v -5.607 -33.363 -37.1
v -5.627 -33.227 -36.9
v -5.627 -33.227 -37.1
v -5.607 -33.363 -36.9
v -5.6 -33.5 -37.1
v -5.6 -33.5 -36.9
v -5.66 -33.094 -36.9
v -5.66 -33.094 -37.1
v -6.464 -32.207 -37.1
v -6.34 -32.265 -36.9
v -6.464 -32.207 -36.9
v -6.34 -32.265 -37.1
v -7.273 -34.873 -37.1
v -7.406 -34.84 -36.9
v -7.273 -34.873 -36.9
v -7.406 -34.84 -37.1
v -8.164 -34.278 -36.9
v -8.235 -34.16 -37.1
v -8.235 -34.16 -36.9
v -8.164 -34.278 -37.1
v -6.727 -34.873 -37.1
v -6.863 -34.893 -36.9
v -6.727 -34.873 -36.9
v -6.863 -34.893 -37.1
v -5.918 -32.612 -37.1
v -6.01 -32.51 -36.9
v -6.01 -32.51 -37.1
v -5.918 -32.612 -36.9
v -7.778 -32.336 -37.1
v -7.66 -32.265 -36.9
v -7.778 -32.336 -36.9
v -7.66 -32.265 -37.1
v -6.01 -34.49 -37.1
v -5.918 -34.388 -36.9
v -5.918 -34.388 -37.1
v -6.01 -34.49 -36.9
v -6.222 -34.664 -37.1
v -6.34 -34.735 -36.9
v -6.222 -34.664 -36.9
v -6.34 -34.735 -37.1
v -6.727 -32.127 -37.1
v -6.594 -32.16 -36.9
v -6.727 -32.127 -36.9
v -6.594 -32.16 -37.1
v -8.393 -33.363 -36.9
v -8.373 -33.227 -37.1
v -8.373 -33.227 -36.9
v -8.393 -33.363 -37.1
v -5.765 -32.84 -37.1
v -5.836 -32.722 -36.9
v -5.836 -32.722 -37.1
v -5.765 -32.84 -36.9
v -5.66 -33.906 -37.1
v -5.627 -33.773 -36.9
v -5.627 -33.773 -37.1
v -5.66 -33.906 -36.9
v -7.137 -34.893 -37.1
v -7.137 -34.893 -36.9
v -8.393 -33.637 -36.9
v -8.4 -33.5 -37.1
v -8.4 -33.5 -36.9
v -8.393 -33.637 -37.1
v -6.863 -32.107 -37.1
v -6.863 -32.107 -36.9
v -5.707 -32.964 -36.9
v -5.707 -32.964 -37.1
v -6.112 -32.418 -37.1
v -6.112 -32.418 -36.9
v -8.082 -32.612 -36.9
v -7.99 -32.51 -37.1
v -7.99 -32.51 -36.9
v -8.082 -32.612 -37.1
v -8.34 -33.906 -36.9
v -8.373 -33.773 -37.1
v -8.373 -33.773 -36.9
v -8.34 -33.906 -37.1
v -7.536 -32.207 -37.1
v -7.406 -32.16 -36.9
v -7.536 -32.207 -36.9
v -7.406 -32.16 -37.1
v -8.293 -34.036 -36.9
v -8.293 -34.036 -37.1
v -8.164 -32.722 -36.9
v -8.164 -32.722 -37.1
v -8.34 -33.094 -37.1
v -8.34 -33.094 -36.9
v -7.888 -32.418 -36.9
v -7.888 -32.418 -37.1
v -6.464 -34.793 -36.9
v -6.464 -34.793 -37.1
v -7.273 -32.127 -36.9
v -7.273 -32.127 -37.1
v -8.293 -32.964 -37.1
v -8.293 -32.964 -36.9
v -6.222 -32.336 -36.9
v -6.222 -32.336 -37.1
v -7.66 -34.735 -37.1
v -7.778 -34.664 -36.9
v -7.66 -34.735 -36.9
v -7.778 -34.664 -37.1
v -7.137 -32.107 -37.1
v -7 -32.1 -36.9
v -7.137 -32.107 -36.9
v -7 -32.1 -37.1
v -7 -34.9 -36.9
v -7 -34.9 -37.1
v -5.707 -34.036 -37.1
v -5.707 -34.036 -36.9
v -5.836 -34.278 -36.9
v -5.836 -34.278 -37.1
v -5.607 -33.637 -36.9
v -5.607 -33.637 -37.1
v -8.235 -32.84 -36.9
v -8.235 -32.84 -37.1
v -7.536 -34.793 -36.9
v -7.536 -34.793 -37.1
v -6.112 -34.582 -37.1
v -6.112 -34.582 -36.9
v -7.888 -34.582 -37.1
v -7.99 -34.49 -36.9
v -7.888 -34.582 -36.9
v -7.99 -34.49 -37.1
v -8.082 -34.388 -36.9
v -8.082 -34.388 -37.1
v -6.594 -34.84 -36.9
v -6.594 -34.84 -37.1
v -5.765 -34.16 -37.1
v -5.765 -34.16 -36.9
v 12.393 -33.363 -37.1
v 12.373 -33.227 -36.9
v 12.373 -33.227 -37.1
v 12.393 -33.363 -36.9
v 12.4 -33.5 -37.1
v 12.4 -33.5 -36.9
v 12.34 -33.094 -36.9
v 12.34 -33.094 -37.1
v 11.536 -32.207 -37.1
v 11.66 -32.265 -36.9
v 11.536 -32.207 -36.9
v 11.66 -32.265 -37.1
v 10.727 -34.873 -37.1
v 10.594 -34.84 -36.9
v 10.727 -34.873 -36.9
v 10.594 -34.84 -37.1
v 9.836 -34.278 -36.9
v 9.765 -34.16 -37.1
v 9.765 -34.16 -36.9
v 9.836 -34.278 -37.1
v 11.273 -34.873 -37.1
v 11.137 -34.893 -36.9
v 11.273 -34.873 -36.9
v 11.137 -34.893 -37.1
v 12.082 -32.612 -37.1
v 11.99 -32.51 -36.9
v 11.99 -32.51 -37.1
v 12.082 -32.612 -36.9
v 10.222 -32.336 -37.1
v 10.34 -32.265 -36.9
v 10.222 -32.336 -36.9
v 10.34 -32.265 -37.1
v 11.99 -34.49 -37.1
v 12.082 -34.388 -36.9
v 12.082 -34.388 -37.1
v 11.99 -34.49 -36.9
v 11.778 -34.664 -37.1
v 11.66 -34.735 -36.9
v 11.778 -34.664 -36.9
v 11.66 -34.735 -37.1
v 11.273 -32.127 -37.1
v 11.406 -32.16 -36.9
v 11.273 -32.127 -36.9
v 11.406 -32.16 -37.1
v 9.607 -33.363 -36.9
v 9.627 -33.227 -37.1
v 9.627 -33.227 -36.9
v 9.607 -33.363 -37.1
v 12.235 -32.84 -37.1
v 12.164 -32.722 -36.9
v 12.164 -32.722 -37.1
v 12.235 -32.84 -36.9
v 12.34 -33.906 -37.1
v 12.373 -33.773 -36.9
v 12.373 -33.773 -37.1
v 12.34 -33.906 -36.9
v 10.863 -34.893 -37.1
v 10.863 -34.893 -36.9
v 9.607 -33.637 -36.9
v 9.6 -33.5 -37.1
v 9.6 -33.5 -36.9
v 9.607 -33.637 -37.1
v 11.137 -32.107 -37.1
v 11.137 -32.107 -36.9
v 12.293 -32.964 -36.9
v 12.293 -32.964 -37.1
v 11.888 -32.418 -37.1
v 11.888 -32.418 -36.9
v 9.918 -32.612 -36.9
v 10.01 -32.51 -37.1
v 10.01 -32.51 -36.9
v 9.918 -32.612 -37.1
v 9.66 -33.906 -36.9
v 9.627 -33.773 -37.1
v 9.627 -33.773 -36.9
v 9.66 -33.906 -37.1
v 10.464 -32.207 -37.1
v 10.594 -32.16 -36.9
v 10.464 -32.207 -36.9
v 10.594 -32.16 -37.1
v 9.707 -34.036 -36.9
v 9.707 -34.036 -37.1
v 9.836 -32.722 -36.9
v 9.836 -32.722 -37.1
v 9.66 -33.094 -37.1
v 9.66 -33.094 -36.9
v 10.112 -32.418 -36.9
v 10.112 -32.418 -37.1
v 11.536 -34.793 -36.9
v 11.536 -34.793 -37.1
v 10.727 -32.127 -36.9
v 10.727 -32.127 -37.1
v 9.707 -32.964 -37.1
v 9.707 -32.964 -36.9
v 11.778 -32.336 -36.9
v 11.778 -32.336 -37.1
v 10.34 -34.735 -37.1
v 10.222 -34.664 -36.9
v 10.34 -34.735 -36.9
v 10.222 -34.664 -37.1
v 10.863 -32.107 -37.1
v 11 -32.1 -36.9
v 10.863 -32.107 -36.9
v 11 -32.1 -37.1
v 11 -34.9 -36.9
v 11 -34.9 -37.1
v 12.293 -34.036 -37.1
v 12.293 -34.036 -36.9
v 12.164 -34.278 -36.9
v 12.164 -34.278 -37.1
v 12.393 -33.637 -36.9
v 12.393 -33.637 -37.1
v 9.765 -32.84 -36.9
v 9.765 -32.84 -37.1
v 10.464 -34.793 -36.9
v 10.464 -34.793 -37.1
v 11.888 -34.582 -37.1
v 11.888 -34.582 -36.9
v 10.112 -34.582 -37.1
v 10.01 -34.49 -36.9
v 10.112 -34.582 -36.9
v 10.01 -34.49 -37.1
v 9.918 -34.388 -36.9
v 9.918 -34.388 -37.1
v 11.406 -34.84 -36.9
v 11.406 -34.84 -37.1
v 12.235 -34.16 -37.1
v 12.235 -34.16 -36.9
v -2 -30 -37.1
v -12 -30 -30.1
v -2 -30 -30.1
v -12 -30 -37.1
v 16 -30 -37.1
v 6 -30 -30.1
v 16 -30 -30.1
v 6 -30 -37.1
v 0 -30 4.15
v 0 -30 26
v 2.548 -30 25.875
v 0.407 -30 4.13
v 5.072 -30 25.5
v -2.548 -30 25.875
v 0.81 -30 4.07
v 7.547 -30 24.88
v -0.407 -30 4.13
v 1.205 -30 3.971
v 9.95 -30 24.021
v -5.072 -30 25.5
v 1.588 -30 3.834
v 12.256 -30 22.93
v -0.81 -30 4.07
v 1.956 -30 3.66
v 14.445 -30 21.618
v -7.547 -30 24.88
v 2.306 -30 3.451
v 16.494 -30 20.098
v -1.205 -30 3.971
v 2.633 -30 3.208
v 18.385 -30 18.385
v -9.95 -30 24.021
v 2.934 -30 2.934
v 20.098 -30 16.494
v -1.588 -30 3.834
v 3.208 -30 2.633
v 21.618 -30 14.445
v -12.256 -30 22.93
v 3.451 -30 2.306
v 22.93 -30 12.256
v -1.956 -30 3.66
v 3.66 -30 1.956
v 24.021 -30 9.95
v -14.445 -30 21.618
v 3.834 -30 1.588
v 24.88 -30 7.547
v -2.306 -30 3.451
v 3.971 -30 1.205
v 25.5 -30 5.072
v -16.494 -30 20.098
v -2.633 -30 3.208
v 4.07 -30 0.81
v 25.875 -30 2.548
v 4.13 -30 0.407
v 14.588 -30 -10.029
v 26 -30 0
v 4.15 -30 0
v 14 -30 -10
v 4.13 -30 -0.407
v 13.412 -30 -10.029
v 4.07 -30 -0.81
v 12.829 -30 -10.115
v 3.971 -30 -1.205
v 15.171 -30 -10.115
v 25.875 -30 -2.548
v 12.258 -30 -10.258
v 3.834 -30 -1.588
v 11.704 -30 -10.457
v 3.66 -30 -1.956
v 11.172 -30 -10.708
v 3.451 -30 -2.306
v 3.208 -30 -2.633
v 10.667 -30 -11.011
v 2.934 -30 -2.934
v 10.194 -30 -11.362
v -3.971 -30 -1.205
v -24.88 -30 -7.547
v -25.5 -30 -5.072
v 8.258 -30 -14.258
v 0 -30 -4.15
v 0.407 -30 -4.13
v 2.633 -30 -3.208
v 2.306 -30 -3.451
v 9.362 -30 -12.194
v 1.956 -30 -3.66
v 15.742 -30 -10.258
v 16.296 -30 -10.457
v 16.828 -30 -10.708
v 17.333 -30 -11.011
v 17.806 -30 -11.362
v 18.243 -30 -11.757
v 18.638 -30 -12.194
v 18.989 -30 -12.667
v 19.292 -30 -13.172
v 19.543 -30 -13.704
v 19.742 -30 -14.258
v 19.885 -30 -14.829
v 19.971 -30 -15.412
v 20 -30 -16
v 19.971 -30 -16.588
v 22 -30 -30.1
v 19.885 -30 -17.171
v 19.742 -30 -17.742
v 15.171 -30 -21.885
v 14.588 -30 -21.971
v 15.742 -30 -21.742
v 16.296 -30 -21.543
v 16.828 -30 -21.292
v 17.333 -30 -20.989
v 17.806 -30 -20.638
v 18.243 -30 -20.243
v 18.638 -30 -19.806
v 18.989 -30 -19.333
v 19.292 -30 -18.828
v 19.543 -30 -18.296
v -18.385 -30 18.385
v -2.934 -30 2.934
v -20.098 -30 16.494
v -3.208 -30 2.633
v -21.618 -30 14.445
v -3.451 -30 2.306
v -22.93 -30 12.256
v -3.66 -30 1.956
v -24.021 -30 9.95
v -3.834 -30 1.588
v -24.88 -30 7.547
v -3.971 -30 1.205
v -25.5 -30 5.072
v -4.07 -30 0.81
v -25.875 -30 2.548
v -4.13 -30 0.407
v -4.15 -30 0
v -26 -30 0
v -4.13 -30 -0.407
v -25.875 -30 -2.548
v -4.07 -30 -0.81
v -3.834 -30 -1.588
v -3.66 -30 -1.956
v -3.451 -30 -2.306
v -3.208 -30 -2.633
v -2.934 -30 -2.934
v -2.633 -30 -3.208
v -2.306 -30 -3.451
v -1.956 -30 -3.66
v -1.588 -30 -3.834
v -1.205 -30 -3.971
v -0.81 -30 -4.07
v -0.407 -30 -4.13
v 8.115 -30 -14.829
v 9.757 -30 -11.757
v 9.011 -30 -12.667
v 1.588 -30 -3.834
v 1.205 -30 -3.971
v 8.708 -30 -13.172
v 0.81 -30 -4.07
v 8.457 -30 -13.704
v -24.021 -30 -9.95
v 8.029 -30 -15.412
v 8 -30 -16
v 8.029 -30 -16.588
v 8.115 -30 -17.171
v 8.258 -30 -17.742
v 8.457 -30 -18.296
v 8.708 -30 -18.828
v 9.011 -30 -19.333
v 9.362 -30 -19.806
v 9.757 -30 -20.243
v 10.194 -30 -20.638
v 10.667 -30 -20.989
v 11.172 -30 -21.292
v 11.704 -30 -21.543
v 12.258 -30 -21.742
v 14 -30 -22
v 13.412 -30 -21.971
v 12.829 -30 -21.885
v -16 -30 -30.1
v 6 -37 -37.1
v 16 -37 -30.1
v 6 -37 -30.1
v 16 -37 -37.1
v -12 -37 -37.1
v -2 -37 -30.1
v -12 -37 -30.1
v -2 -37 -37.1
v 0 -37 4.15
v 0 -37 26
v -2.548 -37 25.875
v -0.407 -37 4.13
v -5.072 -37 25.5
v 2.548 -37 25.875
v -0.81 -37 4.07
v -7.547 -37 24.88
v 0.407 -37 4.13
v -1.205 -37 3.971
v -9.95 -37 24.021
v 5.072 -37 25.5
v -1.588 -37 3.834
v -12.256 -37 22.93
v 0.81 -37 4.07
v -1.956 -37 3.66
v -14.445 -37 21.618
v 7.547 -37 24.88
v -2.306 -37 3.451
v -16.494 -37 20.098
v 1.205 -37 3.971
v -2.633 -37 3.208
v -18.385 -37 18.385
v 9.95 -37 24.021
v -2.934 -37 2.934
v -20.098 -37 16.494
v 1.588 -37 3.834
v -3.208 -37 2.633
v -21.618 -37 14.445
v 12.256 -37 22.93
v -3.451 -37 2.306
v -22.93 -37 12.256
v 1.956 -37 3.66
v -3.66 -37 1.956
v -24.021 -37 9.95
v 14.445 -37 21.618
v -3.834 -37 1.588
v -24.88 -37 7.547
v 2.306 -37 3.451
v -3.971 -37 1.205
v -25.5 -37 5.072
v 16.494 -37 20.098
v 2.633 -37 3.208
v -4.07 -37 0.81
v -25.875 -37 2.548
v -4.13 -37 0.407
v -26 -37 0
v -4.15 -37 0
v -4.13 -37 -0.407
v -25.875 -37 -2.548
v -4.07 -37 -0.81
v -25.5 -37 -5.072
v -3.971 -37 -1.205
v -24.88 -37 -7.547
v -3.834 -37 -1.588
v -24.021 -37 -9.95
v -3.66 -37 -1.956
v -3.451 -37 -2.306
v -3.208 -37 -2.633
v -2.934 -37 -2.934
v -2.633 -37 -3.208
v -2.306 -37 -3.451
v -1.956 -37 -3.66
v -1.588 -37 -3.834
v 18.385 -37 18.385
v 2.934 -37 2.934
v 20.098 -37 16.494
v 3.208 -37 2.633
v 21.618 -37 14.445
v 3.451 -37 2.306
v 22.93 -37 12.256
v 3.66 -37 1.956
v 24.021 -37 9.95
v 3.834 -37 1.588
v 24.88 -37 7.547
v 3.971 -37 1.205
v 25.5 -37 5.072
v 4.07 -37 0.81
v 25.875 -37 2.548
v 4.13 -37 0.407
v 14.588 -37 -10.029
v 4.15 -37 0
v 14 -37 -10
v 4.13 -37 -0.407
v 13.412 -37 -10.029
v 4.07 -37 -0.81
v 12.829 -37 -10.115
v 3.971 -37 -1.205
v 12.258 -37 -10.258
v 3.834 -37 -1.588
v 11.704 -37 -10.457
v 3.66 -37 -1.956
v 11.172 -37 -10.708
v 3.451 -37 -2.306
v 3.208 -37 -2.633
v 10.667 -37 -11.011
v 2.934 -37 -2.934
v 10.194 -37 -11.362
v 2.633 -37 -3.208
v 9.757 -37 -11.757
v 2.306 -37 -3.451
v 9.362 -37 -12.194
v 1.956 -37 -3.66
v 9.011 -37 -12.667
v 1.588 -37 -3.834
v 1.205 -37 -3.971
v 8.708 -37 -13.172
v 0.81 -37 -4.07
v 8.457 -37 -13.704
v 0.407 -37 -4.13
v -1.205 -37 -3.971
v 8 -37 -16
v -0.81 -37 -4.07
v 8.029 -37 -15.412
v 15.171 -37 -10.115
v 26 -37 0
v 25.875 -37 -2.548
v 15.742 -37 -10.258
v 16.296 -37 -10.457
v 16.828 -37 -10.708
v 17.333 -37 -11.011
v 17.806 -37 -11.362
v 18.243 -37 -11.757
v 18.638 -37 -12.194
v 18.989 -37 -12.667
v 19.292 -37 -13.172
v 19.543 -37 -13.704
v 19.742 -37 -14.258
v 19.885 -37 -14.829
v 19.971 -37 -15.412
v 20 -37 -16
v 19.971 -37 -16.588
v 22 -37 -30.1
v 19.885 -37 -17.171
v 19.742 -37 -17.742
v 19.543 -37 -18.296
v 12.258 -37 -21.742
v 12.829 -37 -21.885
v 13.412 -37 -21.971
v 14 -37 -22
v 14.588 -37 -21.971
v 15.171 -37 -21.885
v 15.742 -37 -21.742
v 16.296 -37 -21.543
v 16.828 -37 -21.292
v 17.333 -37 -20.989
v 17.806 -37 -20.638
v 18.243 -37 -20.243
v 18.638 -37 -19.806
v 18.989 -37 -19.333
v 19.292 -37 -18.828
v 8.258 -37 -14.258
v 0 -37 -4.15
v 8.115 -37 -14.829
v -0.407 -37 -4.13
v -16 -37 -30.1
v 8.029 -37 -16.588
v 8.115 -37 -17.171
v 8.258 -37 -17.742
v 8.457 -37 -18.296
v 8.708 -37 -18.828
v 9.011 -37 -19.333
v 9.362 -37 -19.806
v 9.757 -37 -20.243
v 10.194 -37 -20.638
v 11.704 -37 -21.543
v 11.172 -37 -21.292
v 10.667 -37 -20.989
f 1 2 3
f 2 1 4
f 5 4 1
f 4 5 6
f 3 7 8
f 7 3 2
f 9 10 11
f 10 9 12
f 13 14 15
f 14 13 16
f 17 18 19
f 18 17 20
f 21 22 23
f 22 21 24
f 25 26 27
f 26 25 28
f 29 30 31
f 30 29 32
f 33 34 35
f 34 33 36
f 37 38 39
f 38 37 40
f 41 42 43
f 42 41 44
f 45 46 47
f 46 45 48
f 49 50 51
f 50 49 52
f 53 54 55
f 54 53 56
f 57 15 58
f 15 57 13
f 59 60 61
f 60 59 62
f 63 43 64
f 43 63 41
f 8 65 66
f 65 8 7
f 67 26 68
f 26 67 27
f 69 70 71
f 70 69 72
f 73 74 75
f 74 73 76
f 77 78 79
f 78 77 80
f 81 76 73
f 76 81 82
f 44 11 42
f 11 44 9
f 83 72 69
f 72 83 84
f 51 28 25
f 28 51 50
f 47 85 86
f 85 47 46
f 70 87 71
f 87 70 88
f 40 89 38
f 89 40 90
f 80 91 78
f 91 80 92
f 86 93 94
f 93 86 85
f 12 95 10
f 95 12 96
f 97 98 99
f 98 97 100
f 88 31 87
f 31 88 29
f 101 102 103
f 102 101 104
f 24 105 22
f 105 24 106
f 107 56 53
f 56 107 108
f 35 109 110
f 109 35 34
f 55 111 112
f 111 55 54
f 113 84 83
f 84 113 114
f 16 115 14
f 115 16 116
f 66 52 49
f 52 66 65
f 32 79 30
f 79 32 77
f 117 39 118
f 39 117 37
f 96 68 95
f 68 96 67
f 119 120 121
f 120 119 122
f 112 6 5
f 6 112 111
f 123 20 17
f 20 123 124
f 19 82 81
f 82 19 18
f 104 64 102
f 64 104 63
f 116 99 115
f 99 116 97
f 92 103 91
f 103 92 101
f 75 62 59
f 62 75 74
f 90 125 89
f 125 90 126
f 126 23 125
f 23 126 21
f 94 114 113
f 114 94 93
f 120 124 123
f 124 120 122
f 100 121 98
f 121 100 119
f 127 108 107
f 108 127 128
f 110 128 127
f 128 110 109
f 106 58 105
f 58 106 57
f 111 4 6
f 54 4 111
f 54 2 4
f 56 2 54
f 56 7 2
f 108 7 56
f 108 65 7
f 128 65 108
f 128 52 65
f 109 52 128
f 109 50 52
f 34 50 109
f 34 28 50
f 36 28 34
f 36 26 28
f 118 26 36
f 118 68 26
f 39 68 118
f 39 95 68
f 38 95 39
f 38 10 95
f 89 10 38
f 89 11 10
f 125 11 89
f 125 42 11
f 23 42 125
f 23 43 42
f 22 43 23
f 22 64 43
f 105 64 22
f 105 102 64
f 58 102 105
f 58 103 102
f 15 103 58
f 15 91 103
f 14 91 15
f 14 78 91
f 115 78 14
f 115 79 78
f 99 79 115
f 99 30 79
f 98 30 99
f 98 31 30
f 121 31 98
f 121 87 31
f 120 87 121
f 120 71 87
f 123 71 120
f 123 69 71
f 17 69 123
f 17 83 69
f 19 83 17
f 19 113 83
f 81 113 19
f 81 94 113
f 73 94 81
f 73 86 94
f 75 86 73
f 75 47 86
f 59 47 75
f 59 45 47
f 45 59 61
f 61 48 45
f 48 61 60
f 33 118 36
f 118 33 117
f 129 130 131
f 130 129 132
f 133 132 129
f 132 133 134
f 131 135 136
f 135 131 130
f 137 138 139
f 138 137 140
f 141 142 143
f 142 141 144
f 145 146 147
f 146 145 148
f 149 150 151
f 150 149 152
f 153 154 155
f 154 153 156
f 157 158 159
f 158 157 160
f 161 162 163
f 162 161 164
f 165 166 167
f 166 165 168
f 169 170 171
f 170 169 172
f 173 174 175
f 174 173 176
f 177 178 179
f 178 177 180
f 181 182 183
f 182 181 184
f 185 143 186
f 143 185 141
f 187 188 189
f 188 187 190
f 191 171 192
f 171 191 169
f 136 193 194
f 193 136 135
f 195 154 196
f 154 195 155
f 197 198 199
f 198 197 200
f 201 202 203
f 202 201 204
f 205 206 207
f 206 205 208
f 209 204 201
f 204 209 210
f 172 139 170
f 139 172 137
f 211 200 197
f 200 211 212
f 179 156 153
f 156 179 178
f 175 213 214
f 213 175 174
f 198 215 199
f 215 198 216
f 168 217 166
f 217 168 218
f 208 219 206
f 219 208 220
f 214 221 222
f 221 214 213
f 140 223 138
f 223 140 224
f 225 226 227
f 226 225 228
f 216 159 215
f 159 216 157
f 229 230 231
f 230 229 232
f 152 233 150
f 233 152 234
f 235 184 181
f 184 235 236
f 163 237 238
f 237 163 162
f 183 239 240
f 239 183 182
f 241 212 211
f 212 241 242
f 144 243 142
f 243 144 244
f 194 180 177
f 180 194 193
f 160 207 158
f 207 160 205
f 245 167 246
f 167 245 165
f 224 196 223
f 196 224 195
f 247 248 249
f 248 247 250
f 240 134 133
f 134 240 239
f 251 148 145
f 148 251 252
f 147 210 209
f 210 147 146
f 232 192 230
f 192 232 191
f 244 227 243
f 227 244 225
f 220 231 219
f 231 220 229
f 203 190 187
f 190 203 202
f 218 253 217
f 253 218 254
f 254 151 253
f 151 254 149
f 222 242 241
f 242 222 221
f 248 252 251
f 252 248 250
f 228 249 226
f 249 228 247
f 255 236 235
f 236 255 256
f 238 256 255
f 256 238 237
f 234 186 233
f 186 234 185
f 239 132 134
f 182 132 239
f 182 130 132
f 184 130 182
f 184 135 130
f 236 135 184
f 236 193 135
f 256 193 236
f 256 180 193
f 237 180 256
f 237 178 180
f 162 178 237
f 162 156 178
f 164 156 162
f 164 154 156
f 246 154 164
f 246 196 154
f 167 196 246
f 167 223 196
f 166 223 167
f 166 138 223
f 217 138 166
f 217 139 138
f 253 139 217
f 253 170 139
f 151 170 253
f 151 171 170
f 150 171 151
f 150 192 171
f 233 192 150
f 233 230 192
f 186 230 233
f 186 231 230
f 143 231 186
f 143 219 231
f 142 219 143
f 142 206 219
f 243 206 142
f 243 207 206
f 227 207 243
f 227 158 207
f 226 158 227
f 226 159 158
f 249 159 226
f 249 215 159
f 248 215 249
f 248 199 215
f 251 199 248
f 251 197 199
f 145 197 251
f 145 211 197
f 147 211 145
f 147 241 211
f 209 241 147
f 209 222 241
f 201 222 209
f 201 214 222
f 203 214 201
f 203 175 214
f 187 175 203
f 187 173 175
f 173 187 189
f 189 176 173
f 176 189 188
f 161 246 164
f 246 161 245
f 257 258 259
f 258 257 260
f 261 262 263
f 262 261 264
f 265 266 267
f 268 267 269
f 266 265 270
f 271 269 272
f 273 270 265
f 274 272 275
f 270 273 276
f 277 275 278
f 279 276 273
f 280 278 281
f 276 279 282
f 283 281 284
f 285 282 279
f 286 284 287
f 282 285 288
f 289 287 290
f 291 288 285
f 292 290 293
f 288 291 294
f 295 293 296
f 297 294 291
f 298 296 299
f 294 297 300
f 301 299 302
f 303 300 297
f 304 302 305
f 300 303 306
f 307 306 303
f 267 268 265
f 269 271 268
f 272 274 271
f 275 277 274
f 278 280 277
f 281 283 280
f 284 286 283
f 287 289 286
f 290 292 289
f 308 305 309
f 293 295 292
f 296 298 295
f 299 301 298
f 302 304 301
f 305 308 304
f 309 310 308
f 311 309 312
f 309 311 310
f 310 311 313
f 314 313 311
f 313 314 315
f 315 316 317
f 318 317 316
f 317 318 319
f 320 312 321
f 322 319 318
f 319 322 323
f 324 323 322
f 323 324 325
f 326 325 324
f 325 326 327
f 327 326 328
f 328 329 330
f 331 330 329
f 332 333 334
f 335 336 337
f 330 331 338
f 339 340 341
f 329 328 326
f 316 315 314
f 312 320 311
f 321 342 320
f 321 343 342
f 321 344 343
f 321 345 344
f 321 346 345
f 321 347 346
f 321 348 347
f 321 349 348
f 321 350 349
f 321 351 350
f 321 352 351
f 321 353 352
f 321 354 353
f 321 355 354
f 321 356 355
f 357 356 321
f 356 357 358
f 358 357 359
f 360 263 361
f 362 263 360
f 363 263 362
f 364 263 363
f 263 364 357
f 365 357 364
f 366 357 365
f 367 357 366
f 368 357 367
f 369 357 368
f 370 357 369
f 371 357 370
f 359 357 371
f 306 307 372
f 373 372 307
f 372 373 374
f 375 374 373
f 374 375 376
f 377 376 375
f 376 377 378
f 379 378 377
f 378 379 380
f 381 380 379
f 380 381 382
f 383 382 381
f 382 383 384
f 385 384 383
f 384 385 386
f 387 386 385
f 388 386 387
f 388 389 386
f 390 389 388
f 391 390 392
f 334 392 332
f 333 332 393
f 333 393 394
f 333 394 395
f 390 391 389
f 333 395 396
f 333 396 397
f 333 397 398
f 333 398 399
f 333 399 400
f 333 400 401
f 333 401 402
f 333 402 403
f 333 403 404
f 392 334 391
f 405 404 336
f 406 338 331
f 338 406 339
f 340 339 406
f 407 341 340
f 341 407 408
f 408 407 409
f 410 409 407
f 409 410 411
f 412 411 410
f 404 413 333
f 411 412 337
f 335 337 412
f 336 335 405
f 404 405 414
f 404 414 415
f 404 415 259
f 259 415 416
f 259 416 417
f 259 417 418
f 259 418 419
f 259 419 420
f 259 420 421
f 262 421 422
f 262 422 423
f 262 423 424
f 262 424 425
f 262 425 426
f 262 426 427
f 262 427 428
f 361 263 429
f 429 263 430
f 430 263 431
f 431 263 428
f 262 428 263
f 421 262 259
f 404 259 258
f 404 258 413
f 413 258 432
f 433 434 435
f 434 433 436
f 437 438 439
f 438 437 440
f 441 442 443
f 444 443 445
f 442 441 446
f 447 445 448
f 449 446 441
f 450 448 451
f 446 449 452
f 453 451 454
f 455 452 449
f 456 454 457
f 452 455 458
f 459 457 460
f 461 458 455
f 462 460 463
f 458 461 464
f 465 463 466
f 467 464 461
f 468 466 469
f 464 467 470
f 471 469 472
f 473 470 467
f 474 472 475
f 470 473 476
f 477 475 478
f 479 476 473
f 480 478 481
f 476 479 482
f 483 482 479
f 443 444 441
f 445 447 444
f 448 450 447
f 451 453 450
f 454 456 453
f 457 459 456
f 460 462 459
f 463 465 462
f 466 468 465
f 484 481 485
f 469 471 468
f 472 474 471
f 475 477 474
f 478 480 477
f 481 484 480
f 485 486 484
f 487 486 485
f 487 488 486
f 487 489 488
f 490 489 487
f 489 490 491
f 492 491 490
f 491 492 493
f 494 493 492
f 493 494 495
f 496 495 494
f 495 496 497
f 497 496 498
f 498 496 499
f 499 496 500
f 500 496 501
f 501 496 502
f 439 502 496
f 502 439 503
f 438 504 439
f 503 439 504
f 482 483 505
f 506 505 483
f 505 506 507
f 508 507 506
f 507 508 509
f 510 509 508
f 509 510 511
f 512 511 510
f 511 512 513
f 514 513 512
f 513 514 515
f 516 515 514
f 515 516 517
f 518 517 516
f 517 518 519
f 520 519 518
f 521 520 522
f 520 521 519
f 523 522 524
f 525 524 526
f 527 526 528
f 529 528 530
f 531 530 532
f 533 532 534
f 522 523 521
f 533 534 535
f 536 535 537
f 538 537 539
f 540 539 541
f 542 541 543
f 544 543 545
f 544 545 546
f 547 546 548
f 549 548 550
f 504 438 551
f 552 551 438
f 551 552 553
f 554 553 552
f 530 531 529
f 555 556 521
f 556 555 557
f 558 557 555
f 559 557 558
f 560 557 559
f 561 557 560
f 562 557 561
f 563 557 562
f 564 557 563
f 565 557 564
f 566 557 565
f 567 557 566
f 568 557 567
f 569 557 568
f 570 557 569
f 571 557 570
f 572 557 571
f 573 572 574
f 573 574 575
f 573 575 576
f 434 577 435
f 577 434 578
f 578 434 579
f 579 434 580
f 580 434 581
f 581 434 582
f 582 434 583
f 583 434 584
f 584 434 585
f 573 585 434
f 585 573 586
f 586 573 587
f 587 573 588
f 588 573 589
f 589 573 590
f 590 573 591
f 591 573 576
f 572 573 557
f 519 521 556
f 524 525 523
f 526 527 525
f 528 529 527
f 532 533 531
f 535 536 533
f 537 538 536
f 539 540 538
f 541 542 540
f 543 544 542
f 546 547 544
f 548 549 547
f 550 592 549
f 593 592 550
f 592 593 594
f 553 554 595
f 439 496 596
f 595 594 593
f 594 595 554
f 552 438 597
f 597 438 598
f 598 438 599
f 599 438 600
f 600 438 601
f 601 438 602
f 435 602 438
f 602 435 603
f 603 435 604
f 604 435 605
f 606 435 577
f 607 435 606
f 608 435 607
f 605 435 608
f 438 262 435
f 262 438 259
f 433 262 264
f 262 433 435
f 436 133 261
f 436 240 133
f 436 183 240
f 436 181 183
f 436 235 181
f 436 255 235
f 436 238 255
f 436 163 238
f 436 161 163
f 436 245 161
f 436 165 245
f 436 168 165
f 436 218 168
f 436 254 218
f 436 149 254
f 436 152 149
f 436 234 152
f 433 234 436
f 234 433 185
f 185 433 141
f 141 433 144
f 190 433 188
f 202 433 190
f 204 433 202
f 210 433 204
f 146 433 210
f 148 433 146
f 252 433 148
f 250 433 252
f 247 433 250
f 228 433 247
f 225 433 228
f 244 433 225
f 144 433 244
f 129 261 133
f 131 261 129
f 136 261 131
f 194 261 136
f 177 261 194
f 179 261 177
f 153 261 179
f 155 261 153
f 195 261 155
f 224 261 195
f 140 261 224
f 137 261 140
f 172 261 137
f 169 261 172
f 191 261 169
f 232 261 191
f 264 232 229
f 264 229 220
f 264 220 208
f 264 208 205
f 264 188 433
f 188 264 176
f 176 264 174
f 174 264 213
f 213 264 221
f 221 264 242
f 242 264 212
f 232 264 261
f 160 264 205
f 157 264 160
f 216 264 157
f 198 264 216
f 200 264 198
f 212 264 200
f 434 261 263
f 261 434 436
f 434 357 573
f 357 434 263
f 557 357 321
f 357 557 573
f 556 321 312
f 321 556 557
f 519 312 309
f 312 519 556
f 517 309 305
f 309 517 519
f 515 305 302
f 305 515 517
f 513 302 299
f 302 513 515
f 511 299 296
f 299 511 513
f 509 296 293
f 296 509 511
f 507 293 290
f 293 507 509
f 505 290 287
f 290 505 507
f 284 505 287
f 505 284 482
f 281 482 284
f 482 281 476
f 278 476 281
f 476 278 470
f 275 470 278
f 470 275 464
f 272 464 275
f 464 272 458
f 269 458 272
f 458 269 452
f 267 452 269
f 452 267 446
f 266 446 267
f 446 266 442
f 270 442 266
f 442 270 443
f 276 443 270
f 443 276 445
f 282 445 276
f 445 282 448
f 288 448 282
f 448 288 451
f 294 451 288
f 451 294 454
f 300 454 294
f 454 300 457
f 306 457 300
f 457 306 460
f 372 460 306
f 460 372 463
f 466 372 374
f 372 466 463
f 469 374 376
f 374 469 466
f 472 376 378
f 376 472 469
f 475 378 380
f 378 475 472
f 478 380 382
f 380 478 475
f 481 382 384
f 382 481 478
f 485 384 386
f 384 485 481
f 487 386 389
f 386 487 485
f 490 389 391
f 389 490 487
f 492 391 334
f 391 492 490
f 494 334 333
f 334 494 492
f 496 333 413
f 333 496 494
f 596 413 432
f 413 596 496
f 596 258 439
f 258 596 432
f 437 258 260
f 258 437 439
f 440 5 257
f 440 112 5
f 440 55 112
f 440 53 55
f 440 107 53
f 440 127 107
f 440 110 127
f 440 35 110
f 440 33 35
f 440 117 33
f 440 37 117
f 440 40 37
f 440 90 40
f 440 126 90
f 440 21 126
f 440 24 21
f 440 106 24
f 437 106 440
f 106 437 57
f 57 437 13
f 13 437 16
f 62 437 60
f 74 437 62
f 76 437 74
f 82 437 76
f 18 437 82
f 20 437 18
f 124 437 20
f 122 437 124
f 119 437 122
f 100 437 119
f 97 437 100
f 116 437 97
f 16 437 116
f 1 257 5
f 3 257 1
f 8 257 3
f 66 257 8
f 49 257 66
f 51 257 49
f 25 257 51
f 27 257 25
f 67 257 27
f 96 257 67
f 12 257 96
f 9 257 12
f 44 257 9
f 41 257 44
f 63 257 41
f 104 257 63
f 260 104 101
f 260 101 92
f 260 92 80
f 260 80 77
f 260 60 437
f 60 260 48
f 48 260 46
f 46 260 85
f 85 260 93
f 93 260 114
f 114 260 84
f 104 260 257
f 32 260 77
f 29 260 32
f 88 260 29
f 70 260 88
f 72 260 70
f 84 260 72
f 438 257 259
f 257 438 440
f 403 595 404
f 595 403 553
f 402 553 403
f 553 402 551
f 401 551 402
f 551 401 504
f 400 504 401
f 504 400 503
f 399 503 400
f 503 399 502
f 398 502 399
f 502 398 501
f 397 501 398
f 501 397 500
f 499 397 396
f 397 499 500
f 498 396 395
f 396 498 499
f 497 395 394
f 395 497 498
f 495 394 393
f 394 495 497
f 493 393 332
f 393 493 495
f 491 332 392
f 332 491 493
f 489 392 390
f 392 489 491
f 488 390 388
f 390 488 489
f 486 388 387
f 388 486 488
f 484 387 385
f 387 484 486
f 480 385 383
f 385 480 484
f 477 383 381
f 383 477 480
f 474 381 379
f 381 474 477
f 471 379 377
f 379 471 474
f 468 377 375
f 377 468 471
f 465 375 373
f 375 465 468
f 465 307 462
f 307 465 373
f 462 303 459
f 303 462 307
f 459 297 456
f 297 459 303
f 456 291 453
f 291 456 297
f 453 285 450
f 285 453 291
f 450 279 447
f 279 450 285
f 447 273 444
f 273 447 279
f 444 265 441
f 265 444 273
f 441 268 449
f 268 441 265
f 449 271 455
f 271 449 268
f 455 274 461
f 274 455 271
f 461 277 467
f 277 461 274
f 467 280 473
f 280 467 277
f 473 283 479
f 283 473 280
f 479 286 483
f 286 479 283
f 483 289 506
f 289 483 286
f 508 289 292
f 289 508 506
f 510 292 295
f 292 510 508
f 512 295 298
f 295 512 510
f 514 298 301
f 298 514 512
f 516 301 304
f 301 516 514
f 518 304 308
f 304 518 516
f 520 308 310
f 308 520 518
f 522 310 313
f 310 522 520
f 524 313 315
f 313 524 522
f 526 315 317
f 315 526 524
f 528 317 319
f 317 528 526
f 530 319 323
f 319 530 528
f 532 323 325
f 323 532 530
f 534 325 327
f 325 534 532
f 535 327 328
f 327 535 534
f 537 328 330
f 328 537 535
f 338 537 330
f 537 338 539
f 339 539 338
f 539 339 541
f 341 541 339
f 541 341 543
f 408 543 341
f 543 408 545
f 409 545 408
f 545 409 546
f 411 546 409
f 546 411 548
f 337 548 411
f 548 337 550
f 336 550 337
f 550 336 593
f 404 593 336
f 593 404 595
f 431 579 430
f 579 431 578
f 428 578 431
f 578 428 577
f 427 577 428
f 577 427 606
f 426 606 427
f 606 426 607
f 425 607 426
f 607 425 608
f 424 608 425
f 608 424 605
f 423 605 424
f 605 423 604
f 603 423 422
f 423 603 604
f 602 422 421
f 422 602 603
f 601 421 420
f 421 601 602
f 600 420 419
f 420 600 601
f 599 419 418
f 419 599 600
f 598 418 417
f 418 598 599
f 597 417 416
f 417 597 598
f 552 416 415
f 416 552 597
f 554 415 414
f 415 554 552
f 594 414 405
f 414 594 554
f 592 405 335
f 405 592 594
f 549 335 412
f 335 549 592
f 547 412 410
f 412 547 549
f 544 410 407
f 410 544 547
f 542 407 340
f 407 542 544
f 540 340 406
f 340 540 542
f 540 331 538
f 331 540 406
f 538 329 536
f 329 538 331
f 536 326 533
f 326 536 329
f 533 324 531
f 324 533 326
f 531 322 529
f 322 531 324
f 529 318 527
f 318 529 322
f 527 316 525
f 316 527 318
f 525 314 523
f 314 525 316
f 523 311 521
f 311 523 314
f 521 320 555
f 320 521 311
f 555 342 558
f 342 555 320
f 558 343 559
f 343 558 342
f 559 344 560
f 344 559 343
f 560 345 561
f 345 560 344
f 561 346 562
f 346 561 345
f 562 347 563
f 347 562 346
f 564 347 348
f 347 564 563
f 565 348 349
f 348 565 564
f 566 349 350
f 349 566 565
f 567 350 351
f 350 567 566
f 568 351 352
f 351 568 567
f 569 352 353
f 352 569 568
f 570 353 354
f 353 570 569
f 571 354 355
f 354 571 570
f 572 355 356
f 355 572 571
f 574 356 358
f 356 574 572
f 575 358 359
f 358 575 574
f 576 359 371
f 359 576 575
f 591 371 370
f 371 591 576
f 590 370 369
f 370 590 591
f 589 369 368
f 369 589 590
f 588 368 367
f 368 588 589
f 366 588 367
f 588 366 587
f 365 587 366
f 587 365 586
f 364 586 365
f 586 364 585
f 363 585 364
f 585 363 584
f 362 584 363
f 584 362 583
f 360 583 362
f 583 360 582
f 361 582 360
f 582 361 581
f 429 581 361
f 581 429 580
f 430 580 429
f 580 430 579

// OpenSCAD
// file: ../lib/vitamins.scad
// 구매품 목업 (vitamins) — 조립 간섭 확인용 (출력 부품 아님)
// 모든 모듈은 % 배경 처리로 호출부에서 사용 시 STL export에서 제외된다.
// 좌표 규약: 액추에이터는 기어박스 플랜지면 z=0, 출력축 +Z, 몸체 −Z.
include <../config/parameters.scad>

// SF24 스테퍼 모터 (42각). len = 몸체 길이, 플랜지면 z=0, 몸체 −Z
module motor_sf24(len) {
    translate([0, 0, -len])
        linear_extrude(len)
            offset(r = 3) square(motor_frame - 6, center = true);
}

// MG17 유성 기어박스. len = 몸체 길이, 출력 플랜지면 z=0, 출력축 +Z, 몸체 −Z
module gearbox_mg17(len) {
    union() {
        translate([0, 0, -len]) cylinder(d = gbx_frame, h = len);
        cylinder(d = gbx_out_shaft_d, h = gbx_out_shaft_len);
        cylinder(d = nema17_pilot_d, h = 2); // 출력측 파일럿 보스
    }
}

// 모터+기어박스 스택. 출력 플랜지면 z=0, 출력축 +Z
module actuator(motor_len, gbx_len) {
    union() {
        gearbox_mg17(gbx_len);
        translate([0, 0, -gbx_len]) motor_sf24(motor_len);
    }
}

// 관절별 액추에이터 프리셋
module actuator_J1() { actuator(motor_len_SF2424, gbx_len_20to1); }
module actuator_J2() { actuator(motor_len_SF2424, gbx_len_20to1); }
module actuator_J3() { actuator(motor_len_SF2423, gbx_len_20to1); }
module actuator_J4() { actuator(motor_len_SF2422, gbx_len_5to1); }

// 베어링 (zz 실드 단순 링)
module bearing(brg) {
    difference() {
        cylinder(d = brg[1], h = brg[2]);
        translate([0, 0, -0.1]) cylinder(d = brg[0], h = brg[2] + 0.2);
    }
}

// 스트리퍼(숄더) 볼트 — **피벗 샤프트 역할** (CON-001):
// SHCS형 머리 + 연삭 숄더(⌀d × l, 베어링 내경 활주면) + 감경 나사부
module shoulder_bolt(d, l) {
    union() {
        cylinder(d = d, h = l);                              // 숄더 (샤프트면)
        translate([0, 0, -d]) cylinder(d = d * 1.6, h = d);  // 머리
        translate([0, 0, l]) cylinder(d = d * 0.72, h = d);  // 나사부 (M(d-2)급)
    }
}

// 머신 볼트 (SHCS) — **고정 체결 전용** (샤프트 역할 아님)
module machine_bolt(d, l) {
    union() {
        translate([0, 0, -d]) cylinder(d = d * 1.7, h = d);  // 캡 머리
        cylinder(d = d, h = l);                              // 전산 생크
    }
}

// 육각 스탠드오프 (hex standoff, 암-암) — 플레이트 간격 결정 구조재
module hex_standoff(af, l) {
    difference() {
        cylinder(d = af / cos(30), h = l, $fn = 6);
        translate([0, 0, -0.1]) cylinder(d = af * 0.45, h = l + 0.2);
    }
}

// 나일론 락 너트 (nylock) — 회전 관절 축단 풀림 방지 (일반 너트와 구분)
module lock_nut(af, t, bore) {
    difference() {
        union() {
            cylinder(d = af / cos(30), h = t, $fn = 6);
            translate([0, 0, t - 0.1]) cylinder(d = af * 0.92, h = t * 0.5);
        }
        translate([0, 0, -0.1]) cylinder(d = bore, h = 2 * t);
    }
}

// 평와셔 (washer) — CON-001: 피벗은 숄더 볼트 + 와셔
module washer(d_in, t = 1.2) {
    difference() {
        cylinder(d = d_in * 2.2, h = t);
        translate([0, 0, -0.1]) cylinder(d = d_in + 0.3, h = t + 0.2);
    }
}

// 육각 너트 — af = 평면폭(across flats), 보어 = 호칭경
module hex_nut(af, t, bore) {
    difference() {
        cylinder(d = af / cos(30), h = t, $fn = 6);
        translate([0, 0, -0.1]) cylinder(d = bore, h = t + 0.2);
    }
}

// 기계식 마이크로 리미트 스위치 (KW12형) — 몸체만, 레버 생략
module limit_switch() {
    translate([-ls_body[0] / 2, -ls_body[2] / 2, 0])
        cube([ls_body[0], ls_body[2], ls_body[1]]);
}
// file: ../lib/utils.scad
// 공통 모듈 (common modules) — 베어링 시트, 볼트 홀 등
include <../config/parameters.scad>

// 베어링 시트 (bearing seat): 압입 공차 적용 포켓
// brg = [내경, 외경, 폭] (예: BRG_608ZZ)
module bearing_seat(brg) {
    cylinder(d = brg[1] + bearing_press_fit, h = brg[2]);
}

// 베어링 시트 + 내륜 도피 홀 (관통)
// wall = 시트 아래 받침 두께
module bearing_pocket(brg, wall = 2) {
    union() {
        translate([0, 0, wall]) bearing_seat(brg);
        // 내륜 접촉 방지: 내경보다 크고 외경보다 작은 도피 홀
        cylinder(d = (brg[0] + brg[1]) / 2, h = wall + 0.1);
    }
}

// 관통 볼트 홀 (clearance hole)
module bolt_hole(d, h) {
    cylinder(d = d + bolt_hole_oversize, h = h);
}

// NEMA 17 모터 마운트 홀 패턴 (CON-004: SF24 = 42각 NEMA 17 호환)
// h = 판 두께
module nema17_mount(h) {
    union() {
        cylinder(d = nema17_pilot_d + clearance_fit, h = h);
        for (x = [-1, 1], y = [-1, 1])
            translate([x * nema17_hole_pitch / 2, y * nema17_hole_pitch / 2, 0])
                bolt_hole(nema17_bolt_d, h);
    }
}

// 숄더 볼트 피벗 홀 (CON-001)
// d = 숄더 직경 (shoulder_d_small | shoulder_d_large)
module pivot_hole(d, h) {
    cylinder(d = d + clearance_fit, h = h);
}

// 베어링 보스 (bearing boss): 출력물 허브에 베어링 내경 직접 안착 (CON-003)
// 내경 기준 압입 — bearing_press_fit(음수)만큼 키운다
module bearing_boss(brg, h) {
    cylinder(d = brg[0] - bearing_press_fit, h = h);
}

// 육각 너트 포켓 (nut pocket) — 차집합용. af = 평면폭(across flats)
module nut_pocket(af, t) {
    cylinder(d = (af + clearance_fit) / cos(30), h = t, $fn = 6);
}

// 리미트 스위치 장착 홀 쌍 (ELE-004) — 차집합용, X축 방향 피치
module ls_mount_holes(h) {
    for (x = [-1, 1])
        translate([x * ls_hole_pitch / 2, 0, 0])
            cylinder(d = ls_hole_d, h = h);
}

// 케이블 가이드 클립 (ELE-005) — 외면 부착형 C-클립, cable_d 다발 직경
module cable_clip(cable_d = 8, t = 4) {
    wall = 2.5;
    difference() {
        cylinder(d = cable_d + 2 * wall, h = t);
        translate([0, 0, -0.1]) cylinder(d = cable_d, h = t + 0.2);
        // 삽입 개구 (개구 폭 = 케이블 직경의 70%)
        translate([0, -cable_d * 0.35, -0.1])
            cube([cable_d, cable_d * 0.7, t + 0.2]);
    }
}

// 평행/구동 링크 바 (625ZZ 양단, MEC-002/MEC-001a)
// len = 피벗 간 거리. 보스 상면에서 베어링 압입, 하면 내륜 도피 홀.
module link_bar(len) {
    boss_t = BRG_625ZZ[2] + 4;
    difference() {
        union() {
            translate([0, -link_bar_w / 2, (boss_t - link_bar_t) / 2])
                cube([len, link_bar_w, link_bar_t]);
            for (x = [0, len])
                translate([x, 0, 0]) cylinder(d = link_boss_d, h = boss_t);
        }
        for (x = [0, len]) {
            translate([x, 0, boss_t - BRG_625ZZ[2]])
                bearing_seat([BRG_625ZZ[0], BRG_625ZZ[1], BRG_625ZZ[2] + 0.1]);
            translate([x, 0, -0.1])
                cylinder(d = (BRG_625ZZ[0] + BRG_625ZZ[1]) / 2, h = boss_t + 0.2);
        }
    }
}

// 지시선(leader) + 빌보드(billboard) 라벨 — 프리뷰용, $vpr 카메라 추종
// p = 앵커(부품 측), v = 지시선 벡터 (라벨은 p+v 위치)
// 주의: 상위 프레임이 회전된 경우 빌보드가 카메라를 향하지 않음 — 월드 프레임에서 호출할 것
module leader_label(p, v, txt, size = 3.2, col = "white") {
    color(col) {
        hull() {
            translate(p) sphere(d = 1.4, $fn = 12);
            translate(p + v) sphere(d = 1.4, $fn = 12);
        }
        translate(p + v) rotate($vpr) translate([2, -size / 2, 0])
            linear_extrude(0.6) text(txt, size = size);
    }
}

// 축 클램프 슬릿 + M3 핀치 볼트 (차집합용)
// bore_d = 클램프 보어, depth = 보어 깊이, body_d = 보스 외경
module shaft_clamp_cut(bore_d, depth, body_d) {
    union() {
        cylinder(d = bore_d + clearance_fit / 2, h = depth);
        // 슬릿
        translate([-1, 0, -0.1]) cube([2, body_d / 2 + 1, depth + 0.1]);
        // M3 핀치 볼트 (슬릿 직교) — 보어 반경과 보스 반경 사이
        translate([0, (bore_d / 2 + body_d / 2) / 2 + 1, depth / 2])
            rotate([0, 90, 0])
                translate([0, 0, -body_d / 2 - 1])
                    bolt_hole(3, body_d + 2);
    }
}
// file: wrist.scad
// 손목 (wrist) — 순수 플레이트 아키텍처 (v0.13, MEC-002, GEN-003)
// =====================================================================
// 구성 (벽·박스·텅 폐기 — 전부 평판 + 표준 스탠드오프):
//   [side_a/-Y, side_b/+Y] t7 측판, y ±(30..37) — 하완 측판(±22.3) 외측에서
//       ⌀8 숄더 볼트 스택으로 결합 (베어링은 하완 플레이트에 — v0.13 관절 반전).
//       side_b는 혼 일체 (핀 = 5mm 숄더 볼트, 플레이트 관통 + 너트)
//   [top]    t7 수평판 — J4 NEMA17(출력 하향) + 측판 탭 슬롯 ×4 + M3 ×2
//   [bottom] t7 수평판 — 6805ZZ **관통 압입**(폭 7 = 판 두께) + J4 리미트 홀
//   스탠드오프: M4 ×4 + 튜브 ⌀10×26 (top↔bottom 모서리) — 측면 완전 개방
//       (무두 볼트 접근·배선·경량)
// 수동 평행사변형(MEC-002)이 본체(수평) 유지. 하중: 페이로드 → 플랜지 →
//   6805(bottom) → 스탠드오프 → top → 측판 → 손목 볼트 → 하완
// 제조: 전 피스 평판 — FDM 평면 / CNC 2.5D (GEN-002)
include <../config/parameters.scad>
use <../lib/utils.scad>
use <../lib/vitamins.scad>

side_in  = arm_inner_w / 2;                 // 측판 내면 |Y| = 30
top_z    = -(arm_lug_r + 4);                // 상판 상면 (하완 러그 스윕 아래)
top_b    = top_z - arm_plate_t;             // 상판 하면
bot_t    = top_b - (gbx_out_shaft_len + 5); // 하판 상면 = 표준 스탠드오프 L25
bot_b    = bot_t - arm_plate_t;             // 하판 하면
hx0 = -16;  hx1 = wrist_offset + 26;        // 수평판 X 범위
// 두꺼운 육각 스탠드오프 M6 AF13 ×3 (v0.13 — 4점 → 3점 축소)
standoffs = [[28, 22], [72, 22], [50, -22]];
tab_xs = [-12, 6];                          // 측판 탭 발 x 시작 (폭 10)

// 측판 2D (XZ): 피벗 러그 + 푸터 + 탭 발
module w_side2d(horn = false) {
    union() {
        hull() {
            circle(r = arm_lug_r);
            translate([-16, top_z - 0.1]) square([38, 4]);
        }
        if (horn) hull() {                   // 혼 (링크 2 핀, MEC-002)
            translate([0, pl_offset]) circle(d = 14);
            translate([0, 24]) circle(d = 22);
        }
        for (t = tab_xs)                     // 탭 발 (상판 슬롯 결합)
            translate([t, top_z - arm_plate_t - 0.1]) square([10, arm_plate_t + 4]);
    }
}

module w_side(y0, horn = false) {
    difference() {
        translate([0, y0 + arm_plate_t, 0]) rotate([90, 0, 0])
            linear_extrude(arm_plate_t) difference() {
                w_side2d(horn);
                circle(d = shoulder_d_large + clearance_fit);   // 손목 볼트 ⌀8
                if (horn) translate([0, pl_offset])
                    circle(d = shoulder_d_small + clearance_fit); // 혼 핀 ⌀5 관통
                translate([14, -16]) circle(d = 12);            // 경량창
            }
        // 탭 M3 파일럿 (하단 에지 — 상판에서 수직 체결)
        for (t = tab_xs)
            translate([t + 5, y0 + arm_plate_t / 2, top_b - 8])
                cylinder(d = m3_tap_d, h = 8.1);
    }
}

// ── 상판: NEMA17 + 측판 탭 슬롯 + 스탠드오프 ──
module w_top() {
    difference() {
        translate([(hx0 + hx1) / 2, 0, top_b]) linear_extrude(arm_plate_t)
            offset(r = 5) square([hx1 - hx0 - 10, 2 * side_in + 2 * arm_plate_t - 10],
                                 center = true);
        // J4 NEMA17 (기어박스 플랜지 상면 안착, 출력 하향)
        translate([wrist_offset, 0, top_b - 0.1]) nema17_mount(arm_plate_t + 0.2);
        // 측판 탭 슬롯 ×4 + M3 ×2/측판
        for (sy = [-1, 1], t = tab_xs) {
            translate([t - 0.15, sy * side_in - 0.15 - (sy < 0 ? arm_plate_t : 0),
                       top_b - 0.1])
                cube([10.3, arm_plate_t + 0.3, arm_plate_t + 0.2]);
            translate([t + 5, sy * (side_in + arm_plate_t / 2), top_b - 0.1])
                bolt_hole(3, arm_plate_t + 0.2);
        }
        // 스탠드오프 M6 ×3
        for (p = standoffs)
            translate([p[0], p[1], top_b - 0.1]) bolt_hole(6, arm_plate_t + 0.2);
    }
}

// ── 하판: 6805ZZ 관통 압입 + J4 리미트 ──
module w_bottom() {
    difference() {
        translate([(hx0 + hx1) / 2, 0, bot_b]) linear_extrude(arm_plate_t)
            offset(r = 5) square([hx1 - hx0 - 10, 2 * side_in + 2 * arm_plate_t - 10],
                                 center = true);
        // 6805ZZ 관통 압입 (폭 7 = 판 두께, CON-003)
        translate([wrist_offset, 0, bot_b - 0.1])
            cylinder(d = BRG_6805ZZ[1] + bearing_press_fit, h = arm_plate_t + 0.2);
        for (p = standoffs)
            translate([p[0], p[1], bot_b - 0.1]) bolt_hole(6, arm_plate_t + 0.2);
        // J4 리미트 스위치 M2 ×2 (하면 — 플랜지 림 베인 감지, ELE-004)
        translate([wrist_offset + 14, side_in - 4, bot_b - 0.1])
            rotate([0, 0, 90]) ls_mount_holes(arm_plate_t + 0.2);
    }
}

// part: "full"(조립 표시) | "side_a" | "side_b" | "top" | "bottom"
module wrist(part = "full") {
    if (part == "full") {
        w_side(-side_in - arm_plate_t);
        w_side(side_in, horn = true);
        w_top(); w_bottom();
    }
    else if (part == "side_a") w_side(-side_in - arm_plate_t);
    else if (part == "side_b") w_side(side_in, horn = true);
    else if (part == "top") w_top();
    else if (part == "bottom") w_bottom();
}

// 비주얼 참조 (STL 제외)
%translate([wrist_offset, 0, top_z]) rotate([180, 0, 0]) actuator_J4();

wrist();
// file: ../config/parameters.scad
// cobot-lite 전역 파라미터 (global parameters)
// 모든 부품 치수는 이 파일에서만 정의한다 — 매직 넘버 하드코딩 금지 (MEC-008)

/* ===== 출력/렌더링 ===== */
$fn = 64;

/* ===== 공통 가공 여유 (파생 치수에서 참조 — 선행 정의 필수) ===== */
clearance_fit = 0.3;      // 회전/슬라이드 끼움 여유
bolt_hole_oversize = 0.4; // 관통 볼트 홀 여유

/* ===== 베어링 (bearing) — CON-002: 이 4종만 사용 =====
   [내경, 외경, 폭] mm */
BRG_608ZZ  = [8,  22, 7];   // 관절 피벗 (8mm 숄더 볼트)
BRG_625ZZ  = [5,  16, 5];   // 평행 링크 피벗 (5mm 숄더 볼트)
BRG_6805ZZ = [25, 37, 7];   // 손목 롤 축, 중구경 허브
BRG_6810ZZ = [50, 65, 7];   // 베이스 턴테이블 메인 베어링

// 베어링 압입 공차 (press-fit tolerance) — MFG-002
// 외경 기준 -0.1 ~ -0.2mm. 프린터별 보정은 이 변수 하나로 조정한다.
bearing_press_fit = -0.15;

/* ===== 숄더 볼트 (stripper/shoulder bolt) — CON-001 ===== */
shoulder_d_small = 5;   // 625ZZ 결합
shoulder_d_large = 8;   // 608ZZ 결합

/* ===== 링크 길이 — MEC-006 [TBD-4] =====
   리치 500mm 잠정. 비대칭 분할 (J2 자중 부담 보상, MEC-001a 분담 구조) */
L1 = 225;   // 상완 (upper arm): J2 축 → J3 축
L2 = 275;   // 하완 (forearm): J3 축 → 공구 플랜지

/* ===== 링크 꺾임 (팔레타이저식 구조 오프셋) =====
   관절 축 좌표는 불변(직선 L1/L2 기준) — 꺾임은 빔 형상만 변경.
   목적: ① 신장/접힘 한계 자세에서 빔-빔 간섭 여유 확보
        ② 구조 외곽을 축선 위로 올려 저자세 작업 시 팔꿈치 하부 돌출 감소
   니(knee) 수직 오프셋 h = L·pos·(1-pos)·tan(deg) */
ua_bend_deg = 12;     // 상완 꺾임각 (0 = 직선)
ua_bend_pos = 0.68;   // 꺾임 위치 (0~1, J2 기준) — 분할 조인트(95~131) 뒤
fa_bend_deg = 12;     // 하완 꺾임각
fa_bend_pos = 0.5;    // 꺾임 위치 (팔꿈치 기준)

/* ===== 가동 엔벨로프 (소프트 리미트 권고값 — docs/design-notes.md) =====
   접힘각 = J3 - J2 (월드 피치 차).
   -90° = 평행사변형 구동 전동각(transmission angle) 특이점 (크랭크∥링크),
     0° = 완전 신장 특이점 (J2·J3·손목 일직선). 양쪽 모두 운용 금지 */
env_fold_min = -75;   // 접힘 한계 (전동각 sin25° ≈ 0.42 이상 확보)
env_fold_max = -3;    // 신장 한계 (리치 ≈ 499.5mm — 공칭 500 대비 -0.5)

// J3 모터 후방 배치 연장 길이 (MEC-001c)
// J2 액추에이터는 J2 축 동축 직결 (MEC-001b) — 후방 배치 대상은 J3 어셈블리만
// J1 회전 시 베이스·작업물 간섭 확인 필수
rear_extension = 80;    // J2 피벗 → J3 모터+기어박스 어셈블리 중심 [잠정]

/* ===== 턴테이블 (turntable) — MEC-003 ===== */
turntable_bearing_gap = 30;   // 6810ZZ 2개 축방향 이격, 30mm 이상 (SHOULD)

/* ===== 모터 (motor) — CON-004: 산요덴키 SF24 시리즈 =====
   NEMA 17 호환 42각 */
motor_frame = 42;             // 프레임 폭 (mm)
nema17_hole_pitch = 31;       // 고정 볼트 피치
nema17_pilot_d = 22;          // 센터 파일럿 직경
nema17_bolt_d = 3;            // M3

/* ===== 감속비 (gear ratio) — CON-005: 5/10/20만 허용 ===== */
// 주의: MG17-G10(10:1)은 허용 토크 5N·m로 급락 — 변경 시 토크 재검증 (docs/torque-budget.md)
ratio_J1 = 20;
ratio_J2 = 20;
ratio_J3 = 20;   // SF2423 + 20:1 확정 (TBD-3 해결)
ratio_J4 = 5;

/* ===== 기어박스 (gearbox) — MG17 데이터시트 (docs/tbd-research.md TBD-5) ===== */
gbx_frame = 42;            // NEMA 17 플랜지, 모터와 동일 42각
gbx_len_20to1 = 51;        // MG17-G20 길이 (J1~J3)
gbx_len_5to1  = 40;        // MG17-G5 길이 (J4)
gbx_out_shaft_d = 8;       // 출력축 직경
gbx_in_insert = 9.5;       // 입력 결합 깊이 — SF24 축 길이 호환 확인 항목
gbx_mass_20to1 = 400;      // g — 질량 예산 계산용
gbx_mass_5to1  = 350;      // g

/* ===== 모터 몸체 치수 — SF24 카탈로그 일반값 [잠정: 구매 데이터시트로 확인] ===== */
motor_len_SF2424 = 47;    // J1, J2
motor_len_SF2423 = 39;    // J3
motor_len_SF2422 = 33;    // J4
motor_shaft_d = 5;        // SF24 출력축 (MG17 입력 클램프 ⌀5)
gbx_out_shaft_len = 20;   // MG17 출력축 돌출 길이

/* ===== 베이스/J1 (MEC-003, MEC-005) ===== */
base_plate_size = 140;    // 정사각 베이스 플레이트 한 변
base_plate_t = 8;
base_bolt_d = 5;          // M5 ×4 작업대 고정 (MEC-005)
base_bolt_pitch = 120;    // 고정 볼트 피치
base_col_wall = 5;        // 턴테이블 칼럼 벽 두께
col_window_w = 50;        // 칼럼 측면 배선/조립 창 폭
turntable_top_d = 100;    // 턴테이블 상판 직경
turntable_top_t = 8;
j1_actuator_gap = 4;      // 베이스 플레이트 상면 → 모터 하면 여유
col_open_h = 24;          // 모터 플로어 상면 → 하부 베어링 (스템 결합·셋스크류 존)
j1_stem_d = 20;           // 턴테이블 허브 스템(출력축 결합부) 외경
set_screw_pilot_d = 3.4;  // M4 무두 볼트(set screw) 셀프태핑 파일럿
m3_tap_d = 2.8;           // M3 셀프태핑 파일럿 (앵커 등 소형 체결)
shoulder_mount_px = 80;   // 어깨 텅 ↔ 턴테이블 볼트 피치 X
shoulder_mount_py = 50;   // 어깨 텅 ↔ 턴테이블 볼트 피치 Y
shoulder_mount_bolt_d = 5;// M5 ×4
shoulder_tongue_x = 40;   // 어깨 텅 깊이(X) — 포크 내 스윕 간섭 한계 결정 (J2 ≈ ±55°)

/* ===== 암 단면/관절 (MEC-004) — v0.13 플레이트 아키텍처 =====
   원칙: 출력물은 평판(plate)만. 간격은 표준 스페이서 튜브 + 관통 볼트가
   결정 (일체 보스·웹·박스 금지). 관절 베어링은 플레이트에 직접 압입 —
   플레이트 두께 = 608ZZ 폭(7) */
arm_plate_t = 7;          // 측판 두께 = 608ZZ 폭 (베어링 인-플레이트 압입)
fork_standoff_len = 30;   // 표준 육각 스탠드오프 길이 (어깨 포크 갭 = 하완 내폭)
hex_standoff_af = 13;     // 두꺼운 육각 스탠드오프 평면폭 (M6 암-암)
joint_spacer_od = 12;     // 관절 스택 스페이서 튜브 외경 (숄더 ⌀8 위)
ua_split_x = 115;         // 상완 플레이트 분할선 (365 > 빌드 대각 한계)
ua_splice = [99, 131];    // 스플라이스 더블러 볼트 X 위치 (분할선 ±16)
// 어깨 텅(플레이트 스택) 폭 = 플레이트 14 ×2 + 표준 스탠드오프 30 (v0.13)
tongue_w = 28 + fork_standoff_len;          // 58
// 상완 포크 내폭 = 표준 육각 스탠드오프 L60 (전 스탠드오프 표준화 — v0.14).
// 텅 58과의 편차 1mm/측은 J2 스택 M8 와셔가 흡수 (CON-001 와셔 기존 품목)
arm_inner_w = 60;
arm_h = 50;               // 암 단면 높이
j2_axis_h = 90;           // 턴테이블 상면 → J2 축 높이
                          // — J2 +45° 시 후방 러그 하단 ↔ 어깨 플랜지 간섭 회피 (간섭 검사 확인)
j3_crank_len = 40;        // J3 크랭크 = 하완 혼 반경 (평행사변형 1:1)
pl_offset = 45;           // 수동 평행사변형(MEC-002) 피벗 오프셋
                          // — J2 모터 42각 코너 스윕 반경(≈30) + 여유
forearm_inner_w = fork_standoff_len;  // 하완 측판 내폭 = 표준 스탠드오프 30 (v0.13)
beam_w = 40;              // 상완/하완 중앙 보(beam) 폭
arm_lug_r = 26;           // 관절 러그(피벗 보스) 반경 — NEMA17 볼트 코너(r≈21.9) + 벽
beam_wall = 4;            // 보 쉘 벽 두께 (경량화)
pivot_engage = 14;        // 축 클램프/베어링 물림 깊이
crank_t = 8;              // J3 크랭크 암 두께
crank_hub_d = 20;         // 크랭크 허브 외경
crank_hub_w = 12;         // 크랭크 허브 폭
dl_offset = 8;            // 구동 링크 평면: 플레이트 A 외면 → 링크 중심 거리
ua_joint_x = 95;          // 상완 분할 조인트 위치 (MFG-004: 365mm > 빌드 대각 한계)
ua_lap = 36;              // 랩 조인트(소켓-테논) 물림 길이

/* ===== 너트 평면폭 (across flats) ===== */
m3_nut_af = 5.5;
m4_nut_af = 7;
m6_nut_af = 10;
link_bar_w = 12;          // 링크 바 단면 폭
link_bar_t = 6;           // 링크 바 단면 두께
link_boss_d = 24;         // 링크 단부 625ZZ 보스 외경 (625 외경 16 + 벽 4×2)

/* ===== 손목/공구 플랜지 (GEN-004) ===== */
wrist_offset = 50;        // 손목 피치 피벗 → J4(플랜지) 축 수평 오프셋
                          // — J4 모터 몸체 ↔ 하완 러그 스윕 간섭 회피 (≥ lug_r + 모터 반폭)
forearm_len = L2 - wrist_offset; // 팔꿈치 축 → 손목 피치 피벗
wrist_wall = 5;           // 손목 하우징 벽 두께
flange_d = 45;            // 공구 플랜지 직경
flange_t = 8;
flange_bc = 32;           // 그리퍼 볼트 서클
flange_bolt_d = 4;        // M4 ×4

/* ===== 리미트 스위치 (ELE-004) — KW12형 기계식 마이크로 기준품 ===== */
ls_body = [20, 10, 6.5];  // 몸체 [길이, 높이, 두께]
ls_hole_pitch = 9.5;      // 장착 홀 피치
ls_hole_d = 2.3;          // M2 셀프태핑/볼트

/* ===== 질량 산출 (MEC-007, docs/mass-budget.md) ===== */
petgcf_density = 1.30;    // g/cm³ (PETG-CF 카탈로그 일반값)
print_solidity = 0.6;     // 쉘+인필 유효 충전율 [잠정 — 슬라이서 추정으로 대체]
motor_mass_SF2424 = 510;  // g (산요 카탈로그 확정)
motor_mass_SF2423 = 380;
motor_mass_SF2422 = 300;

/* ===== 질량/성능 예산 ===== */
payload = 1.0;            // kg, 그리퍼 포함 정격 (PER-001)
moving_mass_budget = 0.8; // kg, 상완 이후 이동부 상한 (MEC-007)

/* ===== 출력 제약 — MFG-004 (Creality SparkX i7, TBD-8 해결) ===== */
build_volume = [260, 260, 255];
// main file
// 손목 측판 A (-Y) — v0.13 평판. 병렬 출력 단위
include <../config/parameters.scad>
use <wrist.scad>

wrist("side_a");
